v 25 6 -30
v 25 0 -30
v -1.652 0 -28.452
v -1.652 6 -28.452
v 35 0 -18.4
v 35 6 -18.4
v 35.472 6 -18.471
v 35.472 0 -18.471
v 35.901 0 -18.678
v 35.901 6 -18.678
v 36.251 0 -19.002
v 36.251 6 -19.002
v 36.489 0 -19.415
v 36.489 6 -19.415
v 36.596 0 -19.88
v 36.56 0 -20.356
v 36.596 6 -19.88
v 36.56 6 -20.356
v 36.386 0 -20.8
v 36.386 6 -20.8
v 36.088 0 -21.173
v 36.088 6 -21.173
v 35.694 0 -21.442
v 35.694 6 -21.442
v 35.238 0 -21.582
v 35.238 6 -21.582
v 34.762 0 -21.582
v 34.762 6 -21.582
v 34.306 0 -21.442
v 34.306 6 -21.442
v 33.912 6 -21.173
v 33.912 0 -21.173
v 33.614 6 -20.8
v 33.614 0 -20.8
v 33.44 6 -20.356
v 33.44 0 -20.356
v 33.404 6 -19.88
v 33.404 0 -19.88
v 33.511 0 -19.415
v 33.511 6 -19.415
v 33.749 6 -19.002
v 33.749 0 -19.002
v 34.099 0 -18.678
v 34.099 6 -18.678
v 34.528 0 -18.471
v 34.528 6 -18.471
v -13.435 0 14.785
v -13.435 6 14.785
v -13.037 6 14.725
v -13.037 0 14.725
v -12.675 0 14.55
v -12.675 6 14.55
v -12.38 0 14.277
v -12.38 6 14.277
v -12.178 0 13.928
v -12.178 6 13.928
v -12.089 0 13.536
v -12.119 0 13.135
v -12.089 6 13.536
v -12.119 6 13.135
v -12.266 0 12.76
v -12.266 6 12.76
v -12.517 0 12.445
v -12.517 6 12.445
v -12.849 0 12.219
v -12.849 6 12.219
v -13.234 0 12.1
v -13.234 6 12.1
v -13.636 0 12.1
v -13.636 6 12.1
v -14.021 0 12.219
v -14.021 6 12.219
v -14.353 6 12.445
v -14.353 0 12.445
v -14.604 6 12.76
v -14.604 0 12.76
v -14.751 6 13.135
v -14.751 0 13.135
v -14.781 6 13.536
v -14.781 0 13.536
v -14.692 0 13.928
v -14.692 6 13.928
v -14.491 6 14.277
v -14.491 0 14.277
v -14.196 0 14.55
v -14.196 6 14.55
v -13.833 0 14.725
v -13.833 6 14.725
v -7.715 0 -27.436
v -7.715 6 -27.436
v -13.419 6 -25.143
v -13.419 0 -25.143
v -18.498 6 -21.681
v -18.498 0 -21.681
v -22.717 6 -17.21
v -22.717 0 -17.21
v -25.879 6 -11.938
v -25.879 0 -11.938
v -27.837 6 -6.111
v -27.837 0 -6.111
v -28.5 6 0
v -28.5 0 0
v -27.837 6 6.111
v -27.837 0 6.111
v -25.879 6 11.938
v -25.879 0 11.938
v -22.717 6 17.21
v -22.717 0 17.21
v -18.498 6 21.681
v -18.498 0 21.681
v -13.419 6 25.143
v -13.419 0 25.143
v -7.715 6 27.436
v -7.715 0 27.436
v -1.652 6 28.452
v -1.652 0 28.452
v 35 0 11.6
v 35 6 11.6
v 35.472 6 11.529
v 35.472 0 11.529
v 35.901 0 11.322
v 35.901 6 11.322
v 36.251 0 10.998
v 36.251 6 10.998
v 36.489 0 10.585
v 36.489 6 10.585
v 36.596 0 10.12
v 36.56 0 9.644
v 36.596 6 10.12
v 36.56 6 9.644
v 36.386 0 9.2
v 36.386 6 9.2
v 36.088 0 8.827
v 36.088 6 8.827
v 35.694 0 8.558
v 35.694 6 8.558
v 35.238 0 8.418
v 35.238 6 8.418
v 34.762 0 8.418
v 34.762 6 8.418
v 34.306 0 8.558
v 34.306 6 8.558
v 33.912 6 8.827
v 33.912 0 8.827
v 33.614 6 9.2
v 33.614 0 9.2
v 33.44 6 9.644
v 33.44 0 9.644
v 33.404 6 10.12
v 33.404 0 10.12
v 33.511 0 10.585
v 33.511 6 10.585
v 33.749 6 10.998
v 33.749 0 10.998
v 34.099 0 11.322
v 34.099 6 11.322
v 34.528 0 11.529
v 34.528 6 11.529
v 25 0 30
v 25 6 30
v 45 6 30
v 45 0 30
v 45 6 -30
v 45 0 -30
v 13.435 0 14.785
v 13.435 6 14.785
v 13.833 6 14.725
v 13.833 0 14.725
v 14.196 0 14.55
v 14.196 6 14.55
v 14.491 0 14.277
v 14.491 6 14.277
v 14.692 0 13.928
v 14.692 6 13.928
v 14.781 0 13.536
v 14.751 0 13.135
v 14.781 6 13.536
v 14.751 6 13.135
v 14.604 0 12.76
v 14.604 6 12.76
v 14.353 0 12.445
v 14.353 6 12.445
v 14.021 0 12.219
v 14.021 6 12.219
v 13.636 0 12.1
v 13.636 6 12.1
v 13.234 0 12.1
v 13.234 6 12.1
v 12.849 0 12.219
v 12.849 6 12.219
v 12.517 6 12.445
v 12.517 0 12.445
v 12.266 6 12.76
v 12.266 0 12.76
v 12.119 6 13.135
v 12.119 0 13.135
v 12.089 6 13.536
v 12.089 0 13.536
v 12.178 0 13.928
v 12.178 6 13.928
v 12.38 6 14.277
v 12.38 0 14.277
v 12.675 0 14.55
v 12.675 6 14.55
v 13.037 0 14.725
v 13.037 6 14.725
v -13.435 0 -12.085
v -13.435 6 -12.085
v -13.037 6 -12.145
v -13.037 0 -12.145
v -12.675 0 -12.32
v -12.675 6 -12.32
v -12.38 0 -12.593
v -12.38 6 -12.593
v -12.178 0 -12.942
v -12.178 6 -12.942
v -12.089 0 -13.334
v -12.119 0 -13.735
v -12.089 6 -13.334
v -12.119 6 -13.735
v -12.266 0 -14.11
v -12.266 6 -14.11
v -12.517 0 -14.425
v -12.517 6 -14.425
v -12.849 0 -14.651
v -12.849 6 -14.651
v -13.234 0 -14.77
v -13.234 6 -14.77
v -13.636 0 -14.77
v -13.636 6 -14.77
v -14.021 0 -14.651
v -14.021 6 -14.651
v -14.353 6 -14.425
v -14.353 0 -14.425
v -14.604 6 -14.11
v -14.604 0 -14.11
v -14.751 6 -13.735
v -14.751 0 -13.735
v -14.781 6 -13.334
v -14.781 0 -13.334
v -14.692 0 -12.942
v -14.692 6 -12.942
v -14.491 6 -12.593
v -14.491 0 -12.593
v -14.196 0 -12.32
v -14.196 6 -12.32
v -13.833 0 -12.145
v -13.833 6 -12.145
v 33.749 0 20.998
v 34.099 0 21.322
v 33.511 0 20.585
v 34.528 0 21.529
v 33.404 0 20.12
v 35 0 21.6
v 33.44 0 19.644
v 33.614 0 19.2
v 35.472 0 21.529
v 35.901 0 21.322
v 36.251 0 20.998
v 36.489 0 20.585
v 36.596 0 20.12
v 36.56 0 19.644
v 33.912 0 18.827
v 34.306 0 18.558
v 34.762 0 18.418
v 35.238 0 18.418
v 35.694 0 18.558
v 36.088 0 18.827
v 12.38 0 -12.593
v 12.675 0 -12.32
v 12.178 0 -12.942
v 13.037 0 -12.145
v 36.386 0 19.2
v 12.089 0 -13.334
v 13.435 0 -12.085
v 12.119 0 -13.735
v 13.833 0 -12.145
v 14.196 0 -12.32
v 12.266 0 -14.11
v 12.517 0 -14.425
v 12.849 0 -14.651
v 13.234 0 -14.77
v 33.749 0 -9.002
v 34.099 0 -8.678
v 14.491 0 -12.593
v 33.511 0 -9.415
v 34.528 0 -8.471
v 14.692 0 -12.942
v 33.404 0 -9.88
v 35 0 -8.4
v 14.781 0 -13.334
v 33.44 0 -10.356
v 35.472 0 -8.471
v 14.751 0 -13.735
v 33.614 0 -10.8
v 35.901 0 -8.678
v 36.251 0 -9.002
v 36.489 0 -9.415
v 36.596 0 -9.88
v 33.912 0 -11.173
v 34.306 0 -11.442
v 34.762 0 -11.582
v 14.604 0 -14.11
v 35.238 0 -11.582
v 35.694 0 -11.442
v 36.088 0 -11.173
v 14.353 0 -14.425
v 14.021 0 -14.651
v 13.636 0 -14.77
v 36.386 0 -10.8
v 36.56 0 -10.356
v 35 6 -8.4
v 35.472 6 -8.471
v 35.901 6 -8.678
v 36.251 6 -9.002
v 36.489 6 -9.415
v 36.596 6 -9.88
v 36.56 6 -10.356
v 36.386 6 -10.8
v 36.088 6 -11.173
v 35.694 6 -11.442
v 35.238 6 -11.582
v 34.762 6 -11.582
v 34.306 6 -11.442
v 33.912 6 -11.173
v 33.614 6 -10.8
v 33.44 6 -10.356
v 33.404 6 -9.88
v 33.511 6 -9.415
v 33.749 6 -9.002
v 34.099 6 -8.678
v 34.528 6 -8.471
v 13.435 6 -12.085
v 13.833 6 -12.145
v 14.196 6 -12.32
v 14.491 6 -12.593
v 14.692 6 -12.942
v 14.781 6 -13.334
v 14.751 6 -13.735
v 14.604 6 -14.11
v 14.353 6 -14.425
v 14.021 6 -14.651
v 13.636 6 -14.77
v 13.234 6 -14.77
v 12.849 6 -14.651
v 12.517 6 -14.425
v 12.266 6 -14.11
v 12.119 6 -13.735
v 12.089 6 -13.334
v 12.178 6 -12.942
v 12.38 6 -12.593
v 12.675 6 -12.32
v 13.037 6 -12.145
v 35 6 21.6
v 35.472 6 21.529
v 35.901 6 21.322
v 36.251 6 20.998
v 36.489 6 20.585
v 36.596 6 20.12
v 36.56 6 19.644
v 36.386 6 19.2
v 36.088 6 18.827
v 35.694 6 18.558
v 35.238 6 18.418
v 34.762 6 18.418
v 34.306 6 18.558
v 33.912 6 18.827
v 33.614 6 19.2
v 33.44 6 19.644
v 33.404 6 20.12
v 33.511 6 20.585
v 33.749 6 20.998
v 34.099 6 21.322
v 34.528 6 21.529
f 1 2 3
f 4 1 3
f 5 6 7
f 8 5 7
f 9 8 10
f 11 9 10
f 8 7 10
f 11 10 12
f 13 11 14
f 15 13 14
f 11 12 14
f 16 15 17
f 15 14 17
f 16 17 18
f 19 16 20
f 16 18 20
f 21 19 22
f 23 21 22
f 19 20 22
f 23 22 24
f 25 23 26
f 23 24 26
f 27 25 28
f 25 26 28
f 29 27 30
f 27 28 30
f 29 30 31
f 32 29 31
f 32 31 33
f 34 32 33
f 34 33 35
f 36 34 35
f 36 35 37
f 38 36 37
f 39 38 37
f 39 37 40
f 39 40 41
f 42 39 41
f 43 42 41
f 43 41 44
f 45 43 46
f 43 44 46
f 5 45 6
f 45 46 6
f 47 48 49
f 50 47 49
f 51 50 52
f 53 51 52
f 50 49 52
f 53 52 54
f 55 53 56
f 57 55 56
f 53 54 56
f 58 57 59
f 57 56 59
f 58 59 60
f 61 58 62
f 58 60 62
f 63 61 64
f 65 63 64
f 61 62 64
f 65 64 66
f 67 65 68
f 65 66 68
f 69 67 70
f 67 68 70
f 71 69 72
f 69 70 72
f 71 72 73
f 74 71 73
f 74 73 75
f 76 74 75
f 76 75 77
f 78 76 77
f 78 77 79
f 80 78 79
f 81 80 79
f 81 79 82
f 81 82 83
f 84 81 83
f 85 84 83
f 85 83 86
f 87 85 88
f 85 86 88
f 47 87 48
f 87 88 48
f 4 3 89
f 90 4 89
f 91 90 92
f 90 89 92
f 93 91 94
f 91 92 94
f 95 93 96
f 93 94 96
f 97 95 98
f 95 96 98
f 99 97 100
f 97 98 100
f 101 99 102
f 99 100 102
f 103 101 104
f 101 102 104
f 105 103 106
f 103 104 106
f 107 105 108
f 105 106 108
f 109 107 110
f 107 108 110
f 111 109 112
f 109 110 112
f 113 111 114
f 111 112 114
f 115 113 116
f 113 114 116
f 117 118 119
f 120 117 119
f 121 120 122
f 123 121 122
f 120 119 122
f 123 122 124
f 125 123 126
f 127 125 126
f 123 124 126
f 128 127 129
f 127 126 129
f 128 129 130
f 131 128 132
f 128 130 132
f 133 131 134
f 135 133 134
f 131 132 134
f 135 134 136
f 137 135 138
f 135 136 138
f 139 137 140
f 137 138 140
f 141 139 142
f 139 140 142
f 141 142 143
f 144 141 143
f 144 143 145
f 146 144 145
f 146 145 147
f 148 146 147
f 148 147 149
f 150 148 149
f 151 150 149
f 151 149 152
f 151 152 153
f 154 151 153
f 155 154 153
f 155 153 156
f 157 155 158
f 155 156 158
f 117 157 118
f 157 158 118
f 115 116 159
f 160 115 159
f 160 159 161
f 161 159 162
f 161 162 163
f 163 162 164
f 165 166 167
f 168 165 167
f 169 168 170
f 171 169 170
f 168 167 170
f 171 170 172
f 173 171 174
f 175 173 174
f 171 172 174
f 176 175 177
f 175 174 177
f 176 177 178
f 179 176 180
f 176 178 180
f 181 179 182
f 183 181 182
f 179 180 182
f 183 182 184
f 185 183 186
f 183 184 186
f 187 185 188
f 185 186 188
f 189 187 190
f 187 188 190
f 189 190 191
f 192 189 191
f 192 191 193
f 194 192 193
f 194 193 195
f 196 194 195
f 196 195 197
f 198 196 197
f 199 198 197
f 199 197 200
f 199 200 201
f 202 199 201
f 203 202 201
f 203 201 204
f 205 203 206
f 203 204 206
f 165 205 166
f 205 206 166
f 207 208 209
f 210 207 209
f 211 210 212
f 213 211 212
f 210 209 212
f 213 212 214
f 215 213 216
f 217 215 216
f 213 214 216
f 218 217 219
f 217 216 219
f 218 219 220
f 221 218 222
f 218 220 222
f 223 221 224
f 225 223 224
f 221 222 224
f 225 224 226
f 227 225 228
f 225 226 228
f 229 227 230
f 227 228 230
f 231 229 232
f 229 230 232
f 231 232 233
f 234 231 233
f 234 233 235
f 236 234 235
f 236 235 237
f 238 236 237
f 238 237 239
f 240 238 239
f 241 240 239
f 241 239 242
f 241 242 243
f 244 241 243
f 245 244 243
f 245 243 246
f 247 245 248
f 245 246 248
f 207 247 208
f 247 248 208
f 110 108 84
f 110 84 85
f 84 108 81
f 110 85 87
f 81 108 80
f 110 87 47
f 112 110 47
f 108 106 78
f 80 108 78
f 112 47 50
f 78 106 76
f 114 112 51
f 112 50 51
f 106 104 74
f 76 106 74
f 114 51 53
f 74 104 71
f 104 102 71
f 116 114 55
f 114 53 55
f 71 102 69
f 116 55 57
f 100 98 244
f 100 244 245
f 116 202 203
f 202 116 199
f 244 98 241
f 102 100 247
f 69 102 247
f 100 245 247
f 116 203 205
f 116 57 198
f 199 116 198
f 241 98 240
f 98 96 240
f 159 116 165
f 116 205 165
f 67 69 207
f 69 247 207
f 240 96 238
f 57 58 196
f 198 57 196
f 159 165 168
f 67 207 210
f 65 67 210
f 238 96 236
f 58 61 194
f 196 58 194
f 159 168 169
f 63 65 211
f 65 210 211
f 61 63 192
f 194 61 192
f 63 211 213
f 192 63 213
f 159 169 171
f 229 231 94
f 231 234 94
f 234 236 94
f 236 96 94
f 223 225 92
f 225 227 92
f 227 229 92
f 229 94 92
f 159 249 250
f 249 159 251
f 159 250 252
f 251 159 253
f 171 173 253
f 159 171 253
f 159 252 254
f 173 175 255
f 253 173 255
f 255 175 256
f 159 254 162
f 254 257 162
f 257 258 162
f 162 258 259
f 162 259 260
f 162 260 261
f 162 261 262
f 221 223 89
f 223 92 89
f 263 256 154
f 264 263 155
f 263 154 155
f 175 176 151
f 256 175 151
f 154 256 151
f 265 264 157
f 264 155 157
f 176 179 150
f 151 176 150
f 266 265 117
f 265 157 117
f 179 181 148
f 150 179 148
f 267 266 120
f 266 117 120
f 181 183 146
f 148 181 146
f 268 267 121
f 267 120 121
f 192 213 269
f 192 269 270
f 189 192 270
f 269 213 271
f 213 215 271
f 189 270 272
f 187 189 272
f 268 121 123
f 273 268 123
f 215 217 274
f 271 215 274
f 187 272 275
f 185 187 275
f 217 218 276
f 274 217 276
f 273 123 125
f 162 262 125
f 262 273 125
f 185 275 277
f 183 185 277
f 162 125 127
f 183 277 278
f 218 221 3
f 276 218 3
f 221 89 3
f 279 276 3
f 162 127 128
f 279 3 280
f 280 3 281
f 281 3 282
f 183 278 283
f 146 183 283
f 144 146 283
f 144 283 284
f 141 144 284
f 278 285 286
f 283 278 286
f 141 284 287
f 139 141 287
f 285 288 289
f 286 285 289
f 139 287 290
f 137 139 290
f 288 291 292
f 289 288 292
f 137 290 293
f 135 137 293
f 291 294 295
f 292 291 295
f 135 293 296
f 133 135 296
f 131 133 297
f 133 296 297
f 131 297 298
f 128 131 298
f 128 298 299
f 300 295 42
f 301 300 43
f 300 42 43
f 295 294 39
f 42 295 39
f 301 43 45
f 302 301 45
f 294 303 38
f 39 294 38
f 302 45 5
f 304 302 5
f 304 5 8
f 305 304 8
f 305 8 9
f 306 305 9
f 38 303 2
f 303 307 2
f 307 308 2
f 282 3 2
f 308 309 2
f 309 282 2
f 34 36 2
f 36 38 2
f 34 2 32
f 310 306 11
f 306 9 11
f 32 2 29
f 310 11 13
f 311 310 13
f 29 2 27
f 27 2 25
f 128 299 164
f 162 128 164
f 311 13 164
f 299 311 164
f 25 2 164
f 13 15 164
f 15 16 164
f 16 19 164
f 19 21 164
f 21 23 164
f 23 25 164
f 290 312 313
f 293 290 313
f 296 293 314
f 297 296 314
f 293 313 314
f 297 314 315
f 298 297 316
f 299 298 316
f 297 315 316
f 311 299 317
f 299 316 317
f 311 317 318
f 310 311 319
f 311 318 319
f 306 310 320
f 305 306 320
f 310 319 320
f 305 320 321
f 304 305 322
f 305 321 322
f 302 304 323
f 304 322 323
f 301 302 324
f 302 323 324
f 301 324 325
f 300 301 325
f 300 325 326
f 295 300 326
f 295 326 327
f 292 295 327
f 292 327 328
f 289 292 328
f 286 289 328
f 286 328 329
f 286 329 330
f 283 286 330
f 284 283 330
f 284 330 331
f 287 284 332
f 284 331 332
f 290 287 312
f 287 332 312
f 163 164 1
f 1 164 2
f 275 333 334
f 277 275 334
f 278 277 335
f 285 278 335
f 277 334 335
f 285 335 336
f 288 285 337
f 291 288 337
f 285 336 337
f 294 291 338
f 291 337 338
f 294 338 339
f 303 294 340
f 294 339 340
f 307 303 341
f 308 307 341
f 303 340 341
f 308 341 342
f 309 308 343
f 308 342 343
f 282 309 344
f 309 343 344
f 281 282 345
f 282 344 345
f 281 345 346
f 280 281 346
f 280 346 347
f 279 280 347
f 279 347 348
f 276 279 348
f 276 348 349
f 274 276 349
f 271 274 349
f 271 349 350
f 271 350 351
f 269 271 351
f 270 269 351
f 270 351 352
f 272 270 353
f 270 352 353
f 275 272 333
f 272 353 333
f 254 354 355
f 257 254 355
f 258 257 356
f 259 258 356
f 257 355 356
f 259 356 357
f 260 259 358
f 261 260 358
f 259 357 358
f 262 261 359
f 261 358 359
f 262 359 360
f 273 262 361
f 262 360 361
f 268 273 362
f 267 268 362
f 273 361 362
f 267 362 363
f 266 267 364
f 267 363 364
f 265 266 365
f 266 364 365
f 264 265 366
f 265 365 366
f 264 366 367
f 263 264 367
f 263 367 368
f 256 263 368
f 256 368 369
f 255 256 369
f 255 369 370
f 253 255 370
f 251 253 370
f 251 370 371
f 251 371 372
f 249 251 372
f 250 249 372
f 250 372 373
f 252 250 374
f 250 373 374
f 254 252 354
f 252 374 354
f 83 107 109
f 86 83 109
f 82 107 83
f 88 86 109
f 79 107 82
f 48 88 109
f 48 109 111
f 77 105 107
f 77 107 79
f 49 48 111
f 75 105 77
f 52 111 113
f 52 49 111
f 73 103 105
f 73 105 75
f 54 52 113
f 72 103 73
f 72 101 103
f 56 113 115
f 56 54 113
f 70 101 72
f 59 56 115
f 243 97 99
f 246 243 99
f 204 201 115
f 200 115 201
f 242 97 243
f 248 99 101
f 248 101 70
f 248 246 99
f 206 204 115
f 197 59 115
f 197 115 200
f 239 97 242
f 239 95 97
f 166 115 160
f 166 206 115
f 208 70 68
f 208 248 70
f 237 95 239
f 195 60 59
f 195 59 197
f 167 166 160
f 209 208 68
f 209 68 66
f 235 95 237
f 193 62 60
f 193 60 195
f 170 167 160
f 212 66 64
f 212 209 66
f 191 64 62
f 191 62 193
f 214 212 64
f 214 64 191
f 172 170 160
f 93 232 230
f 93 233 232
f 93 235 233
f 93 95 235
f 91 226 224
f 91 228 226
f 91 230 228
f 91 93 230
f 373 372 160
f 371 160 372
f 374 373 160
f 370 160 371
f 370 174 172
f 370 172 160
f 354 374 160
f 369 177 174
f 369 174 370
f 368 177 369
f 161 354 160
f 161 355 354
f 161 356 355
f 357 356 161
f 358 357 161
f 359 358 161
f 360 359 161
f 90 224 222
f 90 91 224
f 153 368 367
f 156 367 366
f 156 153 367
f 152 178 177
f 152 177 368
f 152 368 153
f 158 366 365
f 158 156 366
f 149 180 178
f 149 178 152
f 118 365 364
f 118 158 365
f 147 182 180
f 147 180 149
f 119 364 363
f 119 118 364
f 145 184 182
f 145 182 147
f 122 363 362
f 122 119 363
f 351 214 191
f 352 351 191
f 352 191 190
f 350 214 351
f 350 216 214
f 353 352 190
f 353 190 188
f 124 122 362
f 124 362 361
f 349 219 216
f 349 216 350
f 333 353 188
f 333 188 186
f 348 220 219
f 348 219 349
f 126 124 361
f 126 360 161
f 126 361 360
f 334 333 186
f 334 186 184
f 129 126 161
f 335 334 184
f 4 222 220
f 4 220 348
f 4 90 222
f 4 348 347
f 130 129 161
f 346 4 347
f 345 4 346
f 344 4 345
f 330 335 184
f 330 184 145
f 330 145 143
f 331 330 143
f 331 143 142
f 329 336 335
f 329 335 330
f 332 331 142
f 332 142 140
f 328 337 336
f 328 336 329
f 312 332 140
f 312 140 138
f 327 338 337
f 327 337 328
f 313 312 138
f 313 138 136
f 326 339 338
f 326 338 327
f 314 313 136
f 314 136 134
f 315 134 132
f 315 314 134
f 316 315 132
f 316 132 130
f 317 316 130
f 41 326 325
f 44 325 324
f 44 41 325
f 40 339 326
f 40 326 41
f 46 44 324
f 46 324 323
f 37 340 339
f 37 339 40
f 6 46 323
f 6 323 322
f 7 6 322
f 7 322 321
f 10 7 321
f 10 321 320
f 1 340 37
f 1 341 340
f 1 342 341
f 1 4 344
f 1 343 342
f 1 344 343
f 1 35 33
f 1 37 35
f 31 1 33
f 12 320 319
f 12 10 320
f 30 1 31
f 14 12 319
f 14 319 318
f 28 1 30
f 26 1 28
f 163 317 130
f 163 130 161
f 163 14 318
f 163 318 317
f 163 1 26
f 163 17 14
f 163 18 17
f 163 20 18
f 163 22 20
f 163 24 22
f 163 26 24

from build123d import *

# Parameters (mm, degrees)
EXTRUDE_1_DEPTH     = 6
SKETCH_2_R          = 1.35
CUT_EXTRUDE_1_DEPTH = 6
SKETCH_4_R          = 1.6
CUT_EXTRUDE_2_DEPTH = 6


with BuildPart() as part:
    # 草图1 → 凸台-拉伸1 (new body)
    with BuildSketch(Plane(origin=(0, 0, 0), x_dir=(1, 0, 0), z_dir=(0, 1, 0))):
        with BuildLine():
            Line((45, -30), (45, 30))
            Line((45, 30), (25, 30))
            Line((25, 30), (-1.65246447, 28.452053725))
            ThreePointArc((-1.65246447, 28.452053725), (-28.5, 0), (-1.65246447, -28.452053725))
            Line((-1.65246447, -28.452053725), (25, -30))
            Line((25, -30), (45, -30))
        make_face()
    extrude(amount=EXTRUDE_1_DEPTH)

    # 草图2 → 切除-拉伸1 (cut)
    with BuildSketch(Plane(origin=(0, 6, 0), x_dir=(1, 0, 0), z_dir=(0, 1, 0))):
        with Locations(Location((-13.435028843, 13.435028843, 0), (0, 0, 270))):
            Circle(SKETCH_2_R)
        with Locations(Location((13.435028843, 13.435028843, 0), (0, 0, 270))):
            Circle(SKETCH_2_R)
        with Locations(Location((13.435028843, -13.435028843, 0), (0, 0, 270))):
            Circle(SKETCH_2_R)
        with Locations(Location((-13.435028843, -13.435028843, 0), (0, 0, 270))):
            Circle(SKETCH_2_R)
    extrude(amount=-CUT_EXTRUDE_1_DEPTH, mode=Mode.SUBTRACT)

    # 草图4 → 切除-拉伸2 (cut)
    with BuildSketch(Plane(origin=(0, 6, 0), x_dir=(1, 0, 0), z_dir=(0, 1, 0))):
        with Locations(Location((35, 20, 0), (0, 0, 270))):
            Circle(SKETCH_4_R)
        with Locations(Location((35, 10, 0), (0, 0, 270))):
            Circle(SKETCH_4_R)
        with Locations(Location((35, -20, 0), (0, 0, 270))):
            Circle(SKETCH_4_R)
        with Locations(Location((35, -10, 0), (0, 0, 270))):
            Circle(SKETCH_4_R)
    extrude(amount=-CUT_EXTRUDE_2_DEPTH, mode=Mode.SUBTRACT)


solid = part.part
